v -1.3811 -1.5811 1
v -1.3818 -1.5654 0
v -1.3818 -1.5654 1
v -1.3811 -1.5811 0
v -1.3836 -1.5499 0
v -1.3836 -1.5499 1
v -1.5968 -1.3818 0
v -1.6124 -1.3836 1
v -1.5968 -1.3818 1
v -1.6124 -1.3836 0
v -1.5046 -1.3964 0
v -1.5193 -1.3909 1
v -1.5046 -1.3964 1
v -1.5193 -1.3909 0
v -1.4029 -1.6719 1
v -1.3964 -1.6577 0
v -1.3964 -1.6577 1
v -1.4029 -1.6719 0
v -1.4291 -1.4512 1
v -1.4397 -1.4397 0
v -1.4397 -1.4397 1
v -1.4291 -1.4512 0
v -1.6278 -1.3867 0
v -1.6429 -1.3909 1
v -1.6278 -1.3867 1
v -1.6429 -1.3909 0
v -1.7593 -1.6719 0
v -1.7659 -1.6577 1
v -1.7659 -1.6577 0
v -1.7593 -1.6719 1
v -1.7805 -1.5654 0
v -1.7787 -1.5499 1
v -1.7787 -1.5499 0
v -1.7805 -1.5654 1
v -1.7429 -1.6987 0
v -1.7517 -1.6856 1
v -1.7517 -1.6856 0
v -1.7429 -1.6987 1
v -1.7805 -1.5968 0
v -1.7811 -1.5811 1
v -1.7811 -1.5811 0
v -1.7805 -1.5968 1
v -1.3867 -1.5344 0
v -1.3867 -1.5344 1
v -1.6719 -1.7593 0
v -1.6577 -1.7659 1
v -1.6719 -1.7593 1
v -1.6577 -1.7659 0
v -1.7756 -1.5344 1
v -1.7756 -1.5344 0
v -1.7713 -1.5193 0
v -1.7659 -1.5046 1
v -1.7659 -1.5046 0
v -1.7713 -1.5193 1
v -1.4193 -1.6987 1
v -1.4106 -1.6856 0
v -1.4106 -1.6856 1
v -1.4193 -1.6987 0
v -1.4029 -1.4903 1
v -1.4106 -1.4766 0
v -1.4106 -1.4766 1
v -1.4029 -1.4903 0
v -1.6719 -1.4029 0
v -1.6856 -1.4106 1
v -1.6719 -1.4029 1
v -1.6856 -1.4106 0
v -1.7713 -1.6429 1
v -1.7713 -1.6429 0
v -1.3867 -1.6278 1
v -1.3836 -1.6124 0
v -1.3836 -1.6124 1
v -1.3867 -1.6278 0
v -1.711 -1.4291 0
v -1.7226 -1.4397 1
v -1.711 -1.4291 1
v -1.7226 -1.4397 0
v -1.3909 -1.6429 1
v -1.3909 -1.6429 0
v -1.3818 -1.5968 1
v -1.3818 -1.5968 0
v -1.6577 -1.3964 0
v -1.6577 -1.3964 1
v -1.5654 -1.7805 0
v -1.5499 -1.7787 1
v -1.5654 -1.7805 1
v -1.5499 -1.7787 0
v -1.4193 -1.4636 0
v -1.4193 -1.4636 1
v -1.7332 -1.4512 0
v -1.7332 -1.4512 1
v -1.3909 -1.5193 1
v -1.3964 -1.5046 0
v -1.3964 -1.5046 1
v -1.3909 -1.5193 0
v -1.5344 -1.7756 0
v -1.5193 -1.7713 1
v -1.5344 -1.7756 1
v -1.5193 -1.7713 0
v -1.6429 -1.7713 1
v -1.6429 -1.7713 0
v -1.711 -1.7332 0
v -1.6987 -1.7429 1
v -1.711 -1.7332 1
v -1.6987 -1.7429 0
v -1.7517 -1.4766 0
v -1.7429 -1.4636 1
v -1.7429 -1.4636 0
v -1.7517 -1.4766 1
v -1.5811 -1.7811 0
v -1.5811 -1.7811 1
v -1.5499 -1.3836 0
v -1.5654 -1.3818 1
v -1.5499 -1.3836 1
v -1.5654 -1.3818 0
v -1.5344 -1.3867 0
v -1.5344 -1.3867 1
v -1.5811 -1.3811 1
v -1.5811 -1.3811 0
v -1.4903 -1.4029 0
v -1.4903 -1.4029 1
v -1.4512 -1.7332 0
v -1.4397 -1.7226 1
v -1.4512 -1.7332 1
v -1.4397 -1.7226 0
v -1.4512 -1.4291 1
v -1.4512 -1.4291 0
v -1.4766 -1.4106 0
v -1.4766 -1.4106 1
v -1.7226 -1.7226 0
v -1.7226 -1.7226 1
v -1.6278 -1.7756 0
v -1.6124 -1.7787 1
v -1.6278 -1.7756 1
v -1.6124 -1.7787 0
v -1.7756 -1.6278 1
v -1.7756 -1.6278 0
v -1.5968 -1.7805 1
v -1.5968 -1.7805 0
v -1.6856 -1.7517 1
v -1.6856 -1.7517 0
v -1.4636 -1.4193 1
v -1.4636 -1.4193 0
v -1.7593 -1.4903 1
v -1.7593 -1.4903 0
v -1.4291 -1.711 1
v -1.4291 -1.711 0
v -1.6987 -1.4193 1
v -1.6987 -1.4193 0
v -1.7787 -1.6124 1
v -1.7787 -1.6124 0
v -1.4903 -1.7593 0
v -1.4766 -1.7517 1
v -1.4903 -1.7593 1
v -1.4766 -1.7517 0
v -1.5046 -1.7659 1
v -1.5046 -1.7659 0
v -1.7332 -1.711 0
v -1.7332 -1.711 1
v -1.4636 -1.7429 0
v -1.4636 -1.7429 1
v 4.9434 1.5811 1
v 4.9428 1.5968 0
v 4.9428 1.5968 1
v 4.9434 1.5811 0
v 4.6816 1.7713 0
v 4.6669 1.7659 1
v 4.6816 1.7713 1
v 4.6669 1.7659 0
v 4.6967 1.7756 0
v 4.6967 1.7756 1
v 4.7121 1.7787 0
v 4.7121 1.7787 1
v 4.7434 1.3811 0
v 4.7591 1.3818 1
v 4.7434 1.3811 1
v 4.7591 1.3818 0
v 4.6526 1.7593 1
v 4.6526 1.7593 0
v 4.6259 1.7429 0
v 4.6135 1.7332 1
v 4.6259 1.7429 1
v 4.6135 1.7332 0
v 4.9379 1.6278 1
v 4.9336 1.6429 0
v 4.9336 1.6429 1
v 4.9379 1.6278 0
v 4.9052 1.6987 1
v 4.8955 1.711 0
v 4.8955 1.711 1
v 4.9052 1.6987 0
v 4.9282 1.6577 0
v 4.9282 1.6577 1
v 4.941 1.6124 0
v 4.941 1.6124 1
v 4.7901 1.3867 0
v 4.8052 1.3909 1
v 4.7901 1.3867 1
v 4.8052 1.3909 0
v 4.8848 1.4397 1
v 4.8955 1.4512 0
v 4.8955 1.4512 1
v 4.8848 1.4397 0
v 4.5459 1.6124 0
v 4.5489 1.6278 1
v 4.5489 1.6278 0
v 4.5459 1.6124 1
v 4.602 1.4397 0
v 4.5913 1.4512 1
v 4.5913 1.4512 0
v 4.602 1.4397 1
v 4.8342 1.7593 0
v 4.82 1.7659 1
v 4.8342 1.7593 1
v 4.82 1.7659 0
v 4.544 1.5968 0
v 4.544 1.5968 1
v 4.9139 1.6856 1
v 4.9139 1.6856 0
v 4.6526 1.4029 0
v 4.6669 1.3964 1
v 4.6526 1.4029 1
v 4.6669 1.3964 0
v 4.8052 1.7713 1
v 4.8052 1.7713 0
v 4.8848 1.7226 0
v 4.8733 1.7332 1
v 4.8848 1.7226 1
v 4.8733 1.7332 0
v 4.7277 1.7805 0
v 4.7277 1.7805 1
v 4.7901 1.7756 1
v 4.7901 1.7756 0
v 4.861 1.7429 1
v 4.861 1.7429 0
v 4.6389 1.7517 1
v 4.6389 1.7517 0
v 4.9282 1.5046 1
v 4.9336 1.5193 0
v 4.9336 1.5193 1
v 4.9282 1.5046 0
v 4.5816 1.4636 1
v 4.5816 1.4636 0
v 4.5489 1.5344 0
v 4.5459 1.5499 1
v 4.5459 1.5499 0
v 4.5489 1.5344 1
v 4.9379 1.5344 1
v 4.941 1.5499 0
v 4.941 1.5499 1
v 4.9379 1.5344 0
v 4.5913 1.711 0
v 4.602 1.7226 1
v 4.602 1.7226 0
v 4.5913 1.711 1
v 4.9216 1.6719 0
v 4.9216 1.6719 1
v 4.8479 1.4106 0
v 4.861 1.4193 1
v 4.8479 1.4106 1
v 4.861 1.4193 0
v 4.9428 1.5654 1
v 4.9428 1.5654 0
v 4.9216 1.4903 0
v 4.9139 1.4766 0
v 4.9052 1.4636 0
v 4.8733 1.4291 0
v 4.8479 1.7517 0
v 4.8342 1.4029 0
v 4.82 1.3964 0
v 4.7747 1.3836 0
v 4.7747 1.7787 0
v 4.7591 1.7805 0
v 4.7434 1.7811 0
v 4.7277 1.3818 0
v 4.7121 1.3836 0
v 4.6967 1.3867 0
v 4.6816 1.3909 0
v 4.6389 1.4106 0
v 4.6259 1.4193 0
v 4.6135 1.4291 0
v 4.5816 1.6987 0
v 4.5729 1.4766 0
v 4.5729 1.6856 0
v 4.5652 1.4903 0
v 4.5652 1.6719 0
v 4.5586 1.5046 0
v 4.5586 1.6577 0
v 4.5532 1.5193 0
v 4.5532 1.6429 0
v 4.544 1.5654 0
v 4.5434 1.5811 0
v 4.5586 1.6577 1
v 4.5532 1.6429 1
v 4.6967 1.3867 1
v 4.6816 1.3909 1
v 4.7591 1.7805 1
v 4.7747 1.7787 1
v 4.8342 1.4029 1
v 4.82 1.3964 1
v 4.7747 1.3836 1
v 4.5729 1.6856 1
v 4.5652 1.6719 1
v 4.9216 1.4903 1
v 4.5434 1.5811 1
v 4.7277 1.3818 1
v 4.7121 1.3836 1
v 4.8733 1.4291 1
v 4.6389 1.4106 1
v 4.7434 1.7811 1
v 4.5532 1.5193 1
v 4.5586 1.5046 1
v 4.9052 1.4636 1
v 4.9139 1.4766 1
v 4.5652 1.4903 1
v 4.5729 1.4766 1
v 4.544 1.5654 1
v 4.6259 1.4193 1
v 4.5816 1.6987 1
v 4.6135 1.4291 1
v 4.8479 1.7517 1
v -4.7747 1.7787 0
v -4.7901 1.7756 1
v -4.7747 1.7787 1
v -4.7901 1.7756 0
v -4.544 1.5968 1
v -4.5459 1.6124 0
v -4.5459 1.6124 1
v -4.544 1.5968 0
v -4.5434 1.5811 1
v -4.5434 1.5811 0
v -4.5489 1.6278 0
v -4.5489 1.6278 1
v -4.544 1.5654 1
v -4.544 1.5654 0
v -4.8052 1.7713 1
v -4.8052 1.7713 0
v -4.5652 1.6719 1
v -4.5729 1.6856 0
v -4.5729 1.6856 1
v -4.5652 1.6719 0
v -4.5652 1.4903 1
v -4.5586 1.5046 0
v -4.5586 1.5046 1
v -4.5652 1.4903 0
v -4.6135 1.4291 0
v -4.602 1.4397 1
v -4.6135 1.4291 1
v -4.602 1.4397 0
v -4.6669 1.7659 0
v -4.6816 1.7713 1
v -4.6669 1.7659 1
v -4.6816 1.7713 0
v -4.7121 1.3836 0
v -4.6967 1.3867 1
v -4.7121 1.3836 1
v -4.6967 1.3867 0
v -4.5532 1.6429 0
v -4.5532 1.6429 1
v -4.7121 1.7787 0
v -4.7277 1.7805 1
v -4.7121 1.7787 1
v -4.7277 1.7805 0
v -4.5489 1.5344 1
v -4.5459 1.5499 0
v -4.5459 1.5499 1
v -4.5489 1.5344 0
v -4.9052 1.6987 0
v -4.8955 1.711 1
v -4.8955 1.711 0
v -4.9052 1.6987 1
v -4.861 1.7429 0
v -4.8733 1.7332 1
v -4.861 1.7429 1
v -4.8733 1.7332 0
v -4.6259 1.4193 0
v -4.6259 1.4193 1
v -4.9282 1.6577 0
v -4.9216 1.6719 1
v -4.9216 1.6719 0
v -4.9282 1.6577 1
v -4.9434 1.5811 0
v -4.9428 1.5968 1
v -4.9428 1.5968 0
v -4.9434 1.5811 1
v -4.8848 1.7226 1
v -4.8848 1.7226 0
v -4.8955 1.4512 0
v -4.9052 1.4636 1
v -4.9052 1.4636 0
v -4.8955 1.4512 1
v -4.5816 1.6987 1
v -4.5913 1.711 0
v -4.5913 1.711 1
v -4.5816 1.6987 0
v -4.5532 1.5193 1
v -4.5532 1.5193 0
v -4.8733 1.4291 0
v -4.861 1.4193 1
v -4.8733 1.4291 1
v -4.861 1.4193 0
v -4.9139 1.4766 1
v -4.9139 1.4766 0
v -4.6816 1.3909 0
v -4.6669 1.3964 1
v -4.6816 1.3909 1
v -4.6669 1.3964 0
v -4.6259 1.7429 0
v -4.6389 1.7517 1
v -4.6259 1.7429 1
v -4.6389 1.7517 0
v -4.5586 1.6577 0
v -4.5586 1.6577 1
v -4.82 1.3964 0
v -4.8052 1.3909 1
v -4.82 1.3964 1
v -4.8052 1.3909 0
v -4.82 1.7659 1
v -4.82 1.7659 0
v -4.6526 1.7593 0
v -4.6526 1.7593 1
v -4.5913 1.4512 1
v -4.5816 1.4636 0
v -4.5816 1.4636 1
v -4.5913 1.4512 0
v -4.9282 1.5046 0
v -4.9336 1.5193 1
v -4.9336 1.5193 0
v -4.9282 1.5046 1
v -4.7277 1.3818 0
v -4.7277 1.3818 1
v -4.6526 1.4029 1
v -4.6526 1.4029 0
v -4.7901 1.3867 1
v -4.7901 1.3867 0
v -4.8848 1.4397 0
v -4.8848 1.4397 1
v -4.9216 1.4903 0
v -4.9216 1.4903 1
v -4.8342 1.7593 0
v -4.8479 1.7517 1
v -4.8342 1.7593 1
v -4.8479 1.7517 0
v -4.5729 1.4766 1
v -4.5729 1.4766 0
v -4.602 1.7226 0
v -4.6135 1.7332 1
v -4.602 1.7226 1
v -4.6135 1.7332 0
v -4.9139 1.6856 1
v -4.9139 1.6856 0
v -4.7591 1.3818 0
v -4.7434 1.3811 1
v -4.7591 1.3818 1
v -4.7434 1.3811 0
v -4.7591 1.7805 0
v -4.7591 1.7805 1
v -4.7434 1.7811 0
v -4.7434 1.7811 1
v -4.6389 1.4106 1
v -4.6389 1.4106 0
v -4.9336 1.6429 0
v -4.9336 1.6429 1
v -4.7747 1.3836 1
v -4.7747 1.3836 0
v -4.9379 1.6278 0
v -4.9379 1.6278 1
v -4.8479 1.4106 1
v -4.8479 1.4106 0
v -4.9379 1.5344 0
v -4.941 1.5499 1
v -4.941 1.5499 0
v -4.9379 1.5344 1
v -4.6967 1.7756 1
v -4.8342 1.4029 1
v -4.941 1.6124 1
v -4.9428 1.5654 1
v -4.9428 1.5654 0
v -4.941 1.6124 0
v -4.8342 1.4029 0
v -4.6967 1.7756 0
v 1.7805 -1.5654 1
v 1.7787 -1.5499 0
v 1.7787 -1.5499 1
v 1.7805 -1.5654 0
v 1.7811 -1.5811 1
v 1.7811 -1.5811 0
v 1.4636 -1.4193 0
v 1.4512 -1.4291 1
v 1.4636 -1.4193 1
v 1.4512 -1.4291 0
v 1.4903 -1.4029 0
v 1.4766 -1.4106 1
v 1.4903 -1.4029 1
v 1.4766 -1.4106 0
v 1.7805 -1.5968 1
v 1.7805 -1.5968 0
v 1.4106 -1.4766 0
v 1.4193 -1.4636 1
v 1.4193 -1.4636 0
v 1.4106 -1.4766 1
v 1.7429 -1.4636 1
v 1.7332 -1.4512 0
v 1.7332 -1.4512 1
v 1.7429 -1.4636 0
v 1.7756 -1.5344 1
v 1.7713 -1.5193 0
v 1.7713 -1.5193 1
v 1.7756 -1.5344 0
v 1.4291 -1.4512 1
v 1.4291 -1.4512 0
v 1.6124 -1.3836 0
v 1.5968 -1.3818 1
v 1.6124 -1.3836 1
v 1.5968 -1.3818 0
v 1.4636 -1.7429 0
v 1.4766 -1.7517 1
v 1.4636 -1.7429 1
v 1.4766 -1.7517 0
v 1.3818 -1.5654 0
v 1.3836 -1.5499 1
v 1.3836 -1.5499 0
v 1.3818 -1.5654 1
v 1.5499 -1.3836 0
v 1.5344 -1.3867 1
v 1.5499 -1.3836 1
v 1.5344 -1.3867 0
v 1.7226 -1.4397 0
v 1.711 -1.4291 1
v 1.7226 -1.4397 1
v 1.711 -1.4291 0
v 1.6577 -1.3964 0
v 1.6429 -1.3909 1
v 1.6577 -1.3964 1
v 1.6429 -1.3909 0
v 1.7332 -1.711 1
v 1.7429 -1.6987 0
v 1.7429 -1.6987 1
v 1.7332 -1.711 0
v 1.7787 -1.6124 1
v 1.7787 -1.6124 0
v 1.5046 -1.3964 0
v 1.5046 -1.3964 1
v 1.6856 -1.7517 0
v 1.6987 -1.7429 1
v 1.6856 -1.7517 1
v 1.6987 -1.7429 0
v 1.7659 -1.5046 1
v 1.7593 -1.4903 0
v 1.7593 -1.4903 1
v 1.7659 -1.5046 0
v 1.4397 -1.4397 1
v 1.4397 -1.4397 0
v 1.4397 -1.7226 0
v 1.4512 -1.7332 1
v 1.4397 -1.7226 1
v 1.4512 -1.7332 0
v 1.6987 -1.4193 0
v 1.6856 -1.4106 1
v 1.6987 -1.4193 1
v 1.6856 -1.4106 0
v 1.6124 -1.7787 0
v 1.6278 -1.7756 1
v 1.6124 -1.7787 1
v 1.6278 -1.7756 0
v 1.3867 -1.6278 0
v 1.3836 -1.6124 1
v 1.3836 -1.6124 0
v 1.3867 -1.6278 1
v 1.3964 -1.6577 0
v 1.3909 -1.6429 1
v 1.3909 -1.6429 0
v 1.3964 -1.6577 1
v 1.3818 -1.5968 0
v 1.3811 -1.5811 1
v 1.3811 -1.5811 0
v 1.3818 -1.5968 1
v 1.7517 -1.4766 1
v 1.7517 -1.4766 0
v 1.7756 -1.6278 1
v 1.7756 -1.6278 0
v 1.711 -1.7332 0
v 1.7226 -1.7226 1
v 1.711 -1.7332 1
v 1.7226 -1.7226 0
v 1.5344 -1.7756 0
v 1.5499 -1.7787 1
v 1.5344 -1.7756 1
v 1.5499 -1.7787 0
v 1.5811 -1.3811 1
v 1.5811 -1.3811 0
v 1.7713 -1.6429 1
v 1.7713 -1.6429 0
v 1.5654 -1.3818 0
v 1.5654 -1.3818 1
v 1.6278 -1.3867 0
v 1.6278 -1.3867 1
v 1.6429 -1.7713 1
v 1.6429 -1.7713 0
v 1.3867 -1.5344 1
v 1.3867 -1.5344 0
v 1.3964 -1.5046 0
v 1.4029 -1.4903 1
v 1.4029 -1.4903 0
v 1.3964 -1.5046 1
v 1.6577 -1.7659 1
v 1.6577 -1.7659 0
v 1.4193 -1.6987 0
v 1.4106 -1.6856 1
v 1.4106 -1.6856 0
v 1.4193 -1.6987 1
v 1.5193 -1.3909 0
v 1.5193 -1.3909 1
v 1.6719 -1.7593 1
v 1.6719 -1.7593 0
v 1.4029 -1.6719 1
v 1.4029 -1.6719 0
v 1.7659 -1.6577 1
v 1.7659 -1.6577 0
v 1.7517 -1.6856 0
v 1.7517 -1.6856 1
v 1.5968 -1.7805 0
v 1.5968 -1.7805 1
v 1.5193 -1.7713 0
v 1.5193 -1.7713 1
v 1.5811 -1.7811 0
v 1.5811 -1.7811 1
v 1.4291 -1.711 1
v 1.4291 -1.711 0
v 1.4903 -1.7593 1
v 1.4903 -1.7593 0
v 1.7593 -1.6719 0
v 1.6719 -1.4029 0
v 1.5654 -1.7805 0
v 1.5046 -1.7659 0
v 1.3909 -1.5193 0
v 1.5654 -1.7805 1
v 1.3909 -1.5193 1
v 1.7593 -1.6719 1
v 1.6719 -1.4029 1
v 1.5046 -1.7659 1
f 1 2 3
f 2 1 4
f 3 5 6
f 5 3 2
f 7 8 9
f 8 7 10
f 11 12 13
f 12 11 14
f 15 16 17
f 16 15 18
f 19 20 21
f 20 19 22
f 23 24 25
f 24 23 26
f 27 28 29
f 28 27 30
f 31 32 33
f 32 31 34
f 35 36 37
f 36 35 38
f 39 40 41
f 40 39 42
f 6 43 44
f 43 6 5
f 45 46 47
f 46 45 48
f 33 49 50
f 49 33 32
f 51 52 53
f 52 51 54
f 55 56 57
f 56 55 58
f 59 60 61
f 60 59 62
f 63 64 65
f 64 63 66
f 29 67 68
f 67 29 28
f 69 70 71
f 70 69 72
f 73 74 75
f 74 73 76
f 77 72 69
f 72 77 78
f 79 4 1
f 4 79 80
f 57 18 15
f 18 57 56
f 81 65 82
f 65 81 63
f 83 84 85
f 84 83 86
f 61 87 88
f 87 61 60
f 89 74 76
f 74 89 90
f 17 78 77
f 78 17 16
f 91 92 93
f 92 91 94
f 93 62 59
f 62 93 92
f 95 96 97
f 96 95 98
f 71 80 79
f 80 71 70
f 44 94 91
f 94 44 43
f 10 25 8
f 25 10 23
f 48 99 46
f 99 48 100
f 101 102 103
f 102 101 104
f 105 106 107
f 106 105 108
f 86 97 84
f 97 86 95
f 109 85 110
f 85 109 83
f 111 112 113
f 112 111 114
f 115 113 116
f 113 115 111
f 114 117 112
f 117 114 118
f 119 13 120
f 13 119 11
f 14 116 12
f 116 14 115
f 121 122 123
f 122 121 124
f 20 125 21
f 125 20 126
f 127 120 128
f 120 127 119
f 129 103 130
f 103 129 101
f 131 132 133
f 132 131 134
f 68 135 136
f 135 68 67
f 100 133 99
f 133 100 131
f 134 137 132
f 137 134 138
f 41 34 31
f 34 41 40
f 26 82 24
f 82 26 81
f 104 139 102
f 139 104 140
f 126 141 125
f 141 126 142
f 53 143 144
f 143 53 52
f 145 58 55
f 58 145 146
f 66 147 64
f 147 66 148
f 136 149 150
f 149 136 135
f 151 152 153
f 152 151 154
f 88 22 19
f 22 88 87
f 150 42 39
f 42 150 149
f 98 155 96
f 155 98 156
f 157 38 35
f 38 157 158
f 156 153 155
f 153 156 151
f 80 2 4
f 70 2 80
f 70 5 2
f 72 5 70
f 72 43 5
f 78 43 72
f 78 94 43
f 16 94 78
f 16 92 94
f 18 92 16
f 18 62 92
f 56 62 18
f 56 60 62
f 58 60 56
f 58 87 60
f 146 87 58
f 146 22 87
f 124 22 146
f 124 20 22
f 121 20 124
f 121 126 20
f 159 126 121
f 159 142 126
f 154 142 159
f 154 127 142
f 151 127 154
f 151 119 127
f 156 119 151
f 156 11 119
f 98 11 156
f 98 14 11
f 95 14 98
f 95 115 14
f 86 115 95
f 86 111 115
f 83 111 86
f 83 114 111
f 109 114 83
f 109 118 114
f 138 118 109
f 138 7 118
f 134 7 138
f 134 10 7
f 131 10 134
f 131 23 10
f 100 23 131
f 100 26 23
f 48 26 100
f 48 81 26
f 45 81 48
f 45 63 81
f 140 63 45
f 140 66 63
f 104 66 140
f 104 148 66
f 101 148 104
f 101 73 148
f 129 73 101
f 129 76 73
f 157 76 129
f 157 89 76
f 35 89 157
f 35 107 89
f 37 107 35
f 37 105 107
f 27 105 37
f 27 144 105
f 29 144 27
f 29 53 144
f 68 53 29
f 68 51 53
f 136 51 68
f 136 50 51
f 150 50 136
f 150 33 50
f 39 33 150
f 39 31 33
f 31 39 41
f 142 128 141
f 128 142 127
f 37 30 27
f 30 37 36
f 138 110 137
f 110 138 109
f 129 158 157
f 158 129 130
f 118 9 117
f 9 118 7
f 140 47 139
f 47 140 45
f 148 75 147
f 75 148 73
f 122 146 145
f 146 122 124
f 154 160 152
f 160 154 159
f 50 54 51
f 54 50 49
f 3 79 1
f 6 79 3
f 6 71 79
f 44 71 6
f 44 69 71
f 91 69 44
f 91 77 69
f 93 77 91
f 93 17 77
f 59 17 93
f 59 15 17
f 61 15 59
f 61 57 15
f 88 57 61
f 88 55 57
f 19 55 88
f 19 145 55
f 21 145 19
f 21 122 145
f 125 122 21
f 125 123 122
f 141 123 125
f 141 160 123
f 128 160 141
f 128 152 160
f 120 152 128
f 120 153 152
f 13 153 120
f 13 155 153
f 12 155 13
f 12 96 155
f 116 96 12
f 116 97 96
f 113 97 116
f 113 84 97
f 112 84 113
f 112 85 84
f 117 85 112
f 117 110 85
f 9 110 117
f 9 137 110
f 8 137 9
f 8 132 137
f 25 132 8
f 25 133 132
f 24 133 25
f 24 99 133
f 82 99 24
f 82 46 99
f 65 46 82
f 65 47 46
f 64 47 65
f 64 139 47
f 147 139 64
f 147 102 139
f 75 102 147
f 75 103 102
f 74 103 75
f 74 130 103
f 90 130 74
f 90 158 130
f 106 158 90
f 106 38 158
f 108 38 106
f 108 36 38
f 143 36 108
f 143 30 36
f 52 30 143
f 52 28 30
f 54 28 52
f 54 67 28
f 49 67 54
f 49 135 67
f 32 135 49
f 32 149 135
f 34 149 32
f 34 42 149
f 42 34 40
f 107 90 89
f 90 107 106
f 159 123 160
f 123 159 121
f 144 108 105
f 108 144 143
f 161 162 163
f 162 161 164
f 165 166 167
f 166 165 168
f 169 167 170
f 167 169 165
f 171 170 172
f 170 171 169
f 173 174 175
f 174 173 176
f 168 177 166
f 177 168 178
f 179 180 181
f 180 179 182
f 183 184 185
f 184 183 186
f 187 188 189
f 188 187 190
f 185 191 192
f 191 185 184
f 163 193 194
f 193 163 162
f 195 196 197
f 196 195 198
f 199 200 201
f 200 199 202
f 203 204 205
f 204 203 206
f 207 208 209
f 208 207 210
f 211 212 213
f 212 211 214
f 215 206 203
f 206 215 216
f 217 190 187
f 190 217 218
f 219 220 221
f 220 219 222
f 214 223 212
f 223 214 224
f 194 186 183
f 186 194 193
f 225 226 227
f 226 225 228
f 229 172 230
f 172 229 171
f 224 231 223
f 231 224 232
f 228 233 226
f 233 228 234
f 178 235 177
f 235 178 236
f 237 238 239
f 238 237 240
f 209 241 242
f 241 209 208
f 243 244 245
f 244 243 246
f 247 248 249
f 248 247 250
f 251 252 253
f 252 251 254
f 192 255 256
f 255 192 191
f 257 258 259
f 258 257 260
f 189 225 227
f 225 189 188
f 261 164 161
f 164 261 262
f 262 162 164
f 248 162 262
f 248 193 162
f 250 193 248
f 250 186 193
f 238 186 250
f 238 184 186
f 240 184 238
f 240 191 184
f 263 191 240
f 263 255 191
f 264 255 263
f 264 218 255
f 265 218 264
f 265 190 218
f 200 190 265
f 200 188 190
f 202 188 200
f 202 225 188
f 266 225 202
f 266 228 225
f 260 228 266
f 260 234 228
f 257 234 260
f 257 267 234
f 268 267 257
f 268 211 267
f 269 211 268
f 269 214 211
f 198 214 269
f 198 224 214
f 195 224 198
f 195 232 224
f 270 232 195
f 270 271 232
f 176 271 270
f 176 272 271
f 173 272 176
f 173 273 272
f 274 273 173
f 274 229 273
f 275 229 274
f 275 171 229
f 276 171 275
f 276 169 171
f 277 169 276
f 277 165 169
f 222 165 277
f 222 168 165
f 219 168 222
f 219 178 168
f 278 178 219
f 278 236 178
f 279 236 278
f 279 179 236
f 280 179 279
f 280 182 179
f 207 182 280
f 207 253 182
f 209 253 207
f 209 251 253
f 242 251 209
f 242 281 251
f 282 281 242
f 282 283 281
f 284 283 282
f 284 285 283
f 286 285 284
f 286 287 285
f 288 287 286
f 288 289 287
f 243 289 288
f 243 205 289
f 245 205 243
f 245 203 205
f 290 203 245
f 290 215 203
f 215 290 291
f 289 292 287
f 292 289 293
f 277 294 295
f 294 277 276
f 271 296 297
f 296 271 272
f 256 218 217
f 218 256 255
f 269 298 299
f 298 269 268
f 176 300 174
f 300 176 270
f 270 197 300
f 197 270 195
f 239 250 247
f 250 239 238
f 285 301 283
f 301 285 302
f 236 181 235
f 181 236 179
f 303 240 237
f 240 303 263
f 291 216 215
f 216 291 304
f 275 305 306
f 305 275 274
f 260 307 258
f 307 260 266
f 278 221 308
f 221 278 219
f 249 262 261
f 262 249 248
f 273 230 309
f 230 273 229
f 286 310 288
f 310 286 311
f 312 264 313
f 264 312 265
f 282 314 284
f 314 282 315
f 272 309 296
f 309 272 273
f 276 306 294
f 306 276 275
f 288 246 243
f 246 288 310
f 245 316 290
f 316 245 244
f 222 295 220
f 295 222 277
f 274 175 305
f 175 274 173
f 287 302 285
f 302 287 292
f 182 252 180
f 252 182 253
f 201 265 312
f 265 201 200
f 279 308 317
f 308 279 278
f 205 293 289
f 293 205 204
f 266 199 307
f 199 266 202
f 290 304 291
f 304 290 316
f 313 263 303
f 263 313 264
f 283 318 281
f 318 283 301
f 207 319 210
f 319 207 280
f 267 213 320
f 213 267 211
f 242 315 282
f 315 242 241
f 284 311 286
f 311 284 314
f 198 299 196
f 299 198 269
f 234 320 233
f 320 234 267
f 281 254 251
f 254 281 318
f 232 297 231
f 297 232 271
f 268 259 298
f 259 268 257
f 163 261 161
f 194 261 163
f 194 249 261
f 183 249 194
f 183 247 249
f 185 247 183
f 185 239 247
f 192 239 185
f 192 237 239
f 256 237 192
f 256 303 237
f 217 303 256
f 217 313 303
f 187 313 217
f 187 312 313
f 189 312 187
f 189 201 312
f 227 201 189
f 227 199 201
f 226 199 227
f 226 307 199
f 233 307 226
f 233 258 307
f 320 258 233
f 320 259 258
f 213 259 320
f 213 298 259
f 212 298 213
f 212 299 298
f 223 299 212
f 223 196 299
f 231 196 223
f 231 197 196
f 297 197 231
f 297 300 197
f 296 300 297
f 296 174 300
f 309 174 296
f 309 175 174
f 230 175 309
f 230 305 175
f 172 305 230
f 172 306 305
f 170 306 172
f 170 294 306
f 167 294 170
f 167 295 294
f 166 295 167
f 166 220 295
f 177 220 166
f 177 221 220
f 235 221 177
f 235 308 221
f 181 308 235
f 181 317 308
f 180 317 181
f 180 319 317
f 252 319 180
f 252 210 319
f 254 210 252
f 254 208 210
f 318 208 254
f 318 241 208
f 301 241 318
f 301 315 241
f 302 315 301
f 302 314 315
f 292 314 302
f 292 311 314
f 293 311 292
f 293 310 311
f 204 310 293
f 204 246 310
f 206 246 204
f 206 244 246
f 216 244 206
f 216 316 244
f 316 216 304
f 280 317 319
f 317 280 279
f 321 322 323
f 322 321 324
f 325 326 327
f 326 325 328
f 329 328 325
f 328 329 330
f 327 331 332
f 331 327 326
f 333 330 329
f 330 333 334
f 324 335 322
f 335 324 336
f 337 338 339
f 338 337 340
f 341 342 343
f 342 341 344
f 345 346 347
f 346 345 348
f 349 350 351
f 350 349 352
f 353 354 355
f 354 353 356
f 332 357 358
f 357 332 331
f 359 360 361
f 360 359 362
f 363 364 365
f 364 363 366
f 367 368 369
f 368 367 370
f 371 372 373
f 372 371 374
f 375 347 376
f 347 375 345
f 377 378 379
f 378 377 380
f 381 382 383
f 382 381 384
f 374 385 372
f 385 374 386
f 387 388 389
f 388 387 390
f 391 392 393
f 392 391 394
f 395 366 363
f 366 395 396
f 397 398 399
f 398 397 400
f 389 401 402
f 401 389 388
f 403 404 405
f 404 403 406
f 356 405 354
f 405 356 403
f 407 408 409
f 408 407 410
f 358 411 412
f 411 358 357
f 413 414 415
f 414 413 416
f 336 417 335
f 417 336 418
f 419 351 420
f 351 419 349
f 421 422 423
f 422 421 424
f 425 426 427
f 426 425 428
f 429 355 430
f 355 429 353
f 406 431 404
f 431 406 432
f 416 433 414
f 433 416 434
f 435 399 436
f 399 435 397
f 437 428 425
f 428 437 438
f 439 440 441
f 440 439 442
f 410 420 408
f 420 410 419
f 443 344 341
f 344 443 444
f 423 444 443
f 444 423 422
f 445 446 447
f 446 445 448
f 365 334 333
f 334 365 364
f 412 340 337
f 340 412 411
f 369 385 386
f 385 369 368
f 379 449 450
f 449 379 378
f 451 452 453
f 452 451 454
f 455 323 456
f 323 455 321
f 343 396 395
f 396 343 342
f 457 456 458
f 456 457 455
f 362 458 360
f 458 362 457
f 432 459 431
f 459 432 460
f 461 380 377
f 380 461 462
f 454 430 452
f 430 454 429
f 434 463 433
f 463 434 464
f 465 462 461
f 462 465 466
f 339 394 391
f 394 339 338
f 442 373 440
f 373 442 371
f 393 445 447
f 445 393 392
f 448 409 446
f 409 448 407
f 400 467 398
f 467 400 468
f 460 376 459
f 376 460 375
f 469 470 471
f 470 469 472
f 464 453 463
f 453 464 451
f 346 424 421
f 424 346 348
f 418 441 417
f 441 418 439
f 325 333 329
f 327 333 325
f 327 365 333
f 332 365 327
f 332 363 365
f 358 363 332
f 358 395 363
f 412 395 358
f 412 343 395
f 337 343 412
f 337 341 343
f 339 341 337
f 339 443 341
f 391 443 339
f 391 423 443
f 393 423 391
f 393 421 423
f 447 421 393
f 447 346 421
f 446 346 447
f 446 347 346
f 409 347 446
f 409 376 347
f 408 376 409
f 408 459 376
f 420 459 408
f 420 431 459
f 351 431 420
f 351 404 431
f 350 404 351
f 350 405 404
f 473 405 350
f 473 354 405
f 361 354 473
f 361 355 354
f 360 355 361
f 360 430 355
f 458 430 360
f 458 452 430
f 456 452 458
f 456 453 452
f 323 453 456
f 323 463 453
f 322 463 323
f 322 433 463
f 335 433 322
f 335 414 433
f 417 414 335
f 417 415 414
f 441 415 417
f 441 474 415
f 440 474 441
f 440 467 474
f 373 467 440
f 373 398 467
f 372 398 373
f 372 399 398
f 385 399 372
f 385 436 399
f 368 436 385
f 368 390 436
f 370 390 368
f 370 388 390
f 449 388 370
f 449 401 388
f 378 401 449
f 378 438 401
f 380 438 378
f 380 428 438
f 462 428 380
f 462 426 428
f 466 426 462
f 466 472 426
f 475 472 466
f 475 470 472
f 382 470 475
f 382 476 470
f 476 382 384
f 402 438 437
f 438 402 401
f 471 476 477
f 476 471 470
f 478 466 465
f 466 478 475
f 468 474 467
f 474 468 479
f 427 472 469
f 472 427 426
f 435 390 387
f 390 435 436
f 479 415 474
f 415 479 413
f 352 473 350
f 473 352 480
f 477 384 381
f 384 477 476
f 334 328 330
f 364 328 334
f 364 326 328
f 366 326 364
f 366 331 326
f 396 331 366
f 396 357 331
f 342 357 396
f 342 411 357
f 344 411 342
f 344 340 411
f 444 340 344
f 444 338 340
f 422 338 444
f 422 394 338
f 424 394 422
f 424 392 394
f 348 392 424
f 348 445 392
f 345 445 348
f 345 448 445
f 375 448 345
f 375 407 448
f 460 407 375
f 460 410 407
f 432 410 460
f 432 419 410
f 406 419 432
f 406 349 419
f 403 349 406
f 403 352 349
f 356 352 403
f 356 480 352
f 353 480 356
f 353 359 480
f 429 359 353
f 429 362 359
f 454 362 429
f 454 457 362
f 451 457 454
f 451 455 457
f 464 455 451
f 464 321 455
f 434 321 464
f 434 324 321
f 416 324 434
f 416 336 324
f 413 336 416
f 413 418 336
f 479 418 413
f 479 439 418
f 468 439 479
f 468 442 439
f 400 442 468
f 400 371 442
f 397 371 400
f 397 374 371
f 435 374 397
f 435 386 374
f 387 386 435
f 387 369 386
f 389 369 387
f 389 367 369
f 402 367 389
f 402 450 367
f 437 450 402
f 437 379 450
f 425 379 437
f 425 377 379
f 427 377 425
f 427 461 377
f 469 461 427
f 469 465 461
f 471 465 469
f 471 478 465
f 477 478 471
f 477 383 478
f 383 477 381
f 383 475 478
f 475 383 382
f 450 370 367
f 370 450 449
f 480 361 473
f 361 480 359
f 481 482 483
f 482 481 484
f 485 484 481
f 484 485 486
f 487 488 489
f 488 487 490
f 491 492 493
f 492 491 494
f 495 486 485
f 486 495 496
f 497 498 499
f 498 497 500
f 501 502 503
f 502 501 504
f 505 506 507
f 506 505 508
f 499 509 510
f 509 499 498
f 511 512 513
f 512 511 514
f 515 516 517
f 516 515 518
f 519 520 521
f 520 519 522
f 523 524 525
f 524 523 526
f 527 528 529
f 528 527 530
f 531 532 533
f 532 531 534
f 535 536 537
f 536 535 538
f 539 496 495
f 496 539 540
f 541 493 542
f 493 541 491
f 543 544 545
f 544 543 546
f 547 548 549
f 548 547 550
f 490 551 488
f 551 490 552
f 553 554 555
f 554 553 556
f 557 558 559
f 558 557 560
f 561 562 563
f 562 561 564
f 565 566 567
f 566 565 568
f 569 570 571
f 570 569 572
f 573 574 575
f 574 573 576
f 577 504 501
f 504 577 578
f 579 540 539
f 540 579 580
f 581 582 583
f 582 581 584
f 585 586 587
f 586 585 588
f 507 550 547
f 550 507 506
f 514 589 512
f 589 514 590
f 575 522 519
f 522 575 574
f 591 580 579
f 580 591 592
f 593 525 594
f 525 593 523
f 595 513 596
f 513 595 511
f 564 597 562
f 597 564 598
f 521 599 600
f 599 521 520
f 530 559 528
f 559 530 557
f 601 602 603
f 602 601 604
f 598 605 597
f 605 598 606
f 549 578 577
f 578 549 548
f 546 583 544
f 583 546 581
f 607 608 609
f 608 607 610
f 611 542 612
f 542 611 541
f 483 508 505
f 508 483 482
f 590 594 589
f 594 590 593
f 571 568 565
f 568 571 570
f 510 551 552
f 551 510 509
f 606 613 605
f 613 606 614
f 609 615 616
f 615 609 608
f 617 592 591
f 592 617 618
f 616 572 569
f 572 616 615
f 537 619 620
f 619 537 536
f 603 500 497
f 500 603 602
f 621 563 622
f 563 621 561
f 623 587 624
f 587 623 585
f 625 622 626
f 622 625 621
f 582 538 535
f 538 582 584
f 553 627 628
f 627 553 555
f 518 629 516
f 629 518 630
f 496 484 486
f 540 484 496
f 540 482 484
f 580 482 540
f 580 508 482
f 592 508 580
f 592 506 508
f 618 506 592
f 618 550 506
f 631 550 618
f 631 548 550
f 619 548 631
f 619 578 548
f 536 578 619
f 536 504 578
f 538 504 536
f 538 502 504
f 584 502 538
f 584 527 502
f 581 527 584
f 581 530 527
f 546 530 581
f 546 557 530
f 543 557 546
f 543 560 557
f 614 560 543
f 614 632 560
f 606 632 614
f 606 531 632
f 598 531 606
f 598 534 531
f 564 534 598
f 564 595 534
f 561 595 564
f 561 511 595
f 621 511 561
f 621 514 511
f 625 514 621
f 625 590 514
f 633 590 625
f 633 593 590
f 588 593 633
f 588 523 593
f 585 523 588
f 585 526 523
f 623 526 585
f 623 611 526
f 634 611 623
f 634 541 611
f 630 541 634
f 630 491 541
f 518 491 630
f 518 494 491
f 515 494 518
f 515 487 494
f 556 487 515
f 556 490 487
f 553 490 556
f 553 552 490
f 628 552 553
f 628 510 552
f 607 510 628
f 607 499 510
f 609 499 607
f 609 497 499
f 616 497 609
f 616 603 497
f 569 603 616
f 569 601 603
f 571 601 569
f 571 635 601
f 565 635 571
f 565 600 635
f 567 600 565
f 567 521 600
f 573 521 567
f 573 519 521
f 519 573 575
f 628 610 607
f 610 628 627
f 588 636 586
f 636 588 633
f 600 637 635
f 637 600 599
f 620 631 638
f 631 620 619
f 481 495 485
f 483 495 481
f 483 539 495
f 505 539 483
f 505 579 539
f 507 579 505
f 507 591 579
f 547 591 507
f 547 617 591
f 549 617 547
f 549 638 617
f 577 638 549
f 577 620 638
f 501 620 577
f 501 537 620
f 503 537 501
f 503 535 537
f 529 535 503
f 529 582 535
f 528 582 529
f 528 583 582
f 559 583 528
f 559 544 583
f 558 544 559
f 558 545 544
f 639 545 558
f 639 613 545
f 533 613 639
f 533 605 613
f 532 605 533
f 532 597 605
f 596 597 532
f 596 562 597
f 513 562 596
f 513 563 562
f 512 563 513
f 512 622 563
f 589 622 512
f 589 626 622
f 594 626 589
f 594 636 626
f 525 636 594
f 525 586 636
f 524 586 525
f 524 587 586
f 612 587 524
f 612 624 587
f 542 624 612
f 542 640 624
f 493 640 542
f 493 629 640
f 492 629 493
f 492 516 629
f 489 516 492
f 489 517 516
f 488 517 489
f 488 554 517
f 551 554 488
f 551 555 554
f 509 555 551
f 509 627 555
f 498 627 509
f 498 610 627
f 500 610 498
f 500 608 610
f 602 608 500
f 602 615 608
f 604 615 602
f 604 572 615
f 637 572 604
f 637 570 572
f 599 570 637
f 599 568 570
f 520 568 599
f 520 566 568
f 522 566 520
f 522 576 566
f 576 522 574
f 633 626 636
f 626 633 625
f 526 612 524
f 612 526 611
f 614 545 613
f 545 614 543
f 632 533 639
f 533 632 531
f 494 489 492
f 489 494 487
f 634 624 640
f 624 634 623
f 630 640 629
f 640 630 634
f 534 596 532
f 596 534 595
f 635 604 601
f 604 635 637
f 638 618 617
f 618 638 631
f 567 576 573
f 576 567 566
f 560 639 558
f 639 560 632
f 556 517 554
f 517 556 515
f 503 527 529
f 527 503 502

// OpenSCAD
// Generated by SolidPython 1.1.3 on 2026-03-31 17:10:39
$fn = 80;


union() {
	translate(v = [-1.5811388300841898, -1.5811388300841898, 0]) {
		cylinder(h = 1.0000000000, r = 0.2000000000);
	}
	translate(v = [4.743416490252569, 1.58113883008419, 0]) {
		cylinder(h = 1.0000000000, r = 0.2000000000);
	}
	translate(v = [-4.743416490252569, 1.581138830084189, 0]) {
		cylinder(h = 1.0000000000, r = 0.2000000000);
	}
	translate(v = [1.58113883008419, -1.5811388300841895, 0]) {
		cylinder(h = 1.0000000000, r = 0.2000000000);
	}
}
/***********************************************
*********      SolidPython code:      **********
************************************************
 
import numpy as np
import math
import subprocess
from solid import *
from solid.utils import *

# --------------------------------------------------
# INPUT PATH
# --------------------------------------------------

POINTS = np.array([
    [0.0, 0.0],
    [0.0, 1.0],
    [1.0, 0.0],
    [0.0, 0.0],
], dtype=float)

FOLLOWER_RADIUS = 0.2
CYLINDER_HEIGHT = 1.0
TARGET_SCALE = 5.0
NUM_SAMPLED_POINTS = len(POINTS)

SCAD_FILENAME = "groove_debug.scad"
STL_FILENAME = "groove_debug.stl"

# --------------------------------------------------
# HELPERS
# --------------------------------------------------

def rotation_matrix(theta):
    c = math.cos(theta)
    s = math.sin(theta)
    return np.array([
        [c, -s],
        [s,  c]
    ], dtype=float)

def normalize_and_scale_points(points, target_scale=1.0):
    pts = np.array(points, dtype=float)

    # Center the points
    pts = pts - pts.mean(axis=0)

    # Find the largest radius from origin
    radii = np.linalg.norm(pts, axis=1)
    max_radius = np.max(radii)

    # Avoid division by zero
    if max_radius < 1e-12:
        return pts

    # Scale so the maximum radius becomes target_scale
    pts = pts / max_radius * target_scale
    return pts

# --------------------------------------------------
# PREPARE PATH
# --------------------------------------------------

pts = normalize_and_scale_points(POINTS, TARGET_SCALE)
d_theta = 2 * math.pi / NUM_SAMPLED_POINTS

# --------------------------------------------------
# BUILD DEBUG GROOVE AS CYLINDERS
# --------------------------------------------------

cylinders = []

for i in range(NUM_SAMPLED_POINTS):
    theta = i * d_theta

    # Desired follower location in world frame
    Q = pts[i]

    # Groove point in cam frame
    C = rotation_matrix(-theta) @ Q
    x, y = C

    cyl = translate([x, y, 0])(
        cylinder(r=FOLLOWER_RADIUS, h=CYLINDER_HEIGHT)
    )

    cylinders.append(cyl)

groove_debug = union()(*cylinders)

# --------------------------------------------------
# WRITE SCAD
# --------------------------------------------------

scad_render_to_file(
    groove_debug,
    SCAD_FILENAME,
    file_header='$fn = 80;'
)

print(f"Wrote {SCAD_FILENAME}")

# --------------------------------------------------
# CONVERT SCAD -> STL
# --------------------------------------------------

try:
    subprocess.run(
        ["openscad", "-o", STL_FILENAME, SCAD_FILENAME],
        check=True
    )
    print(f"Wrote {STL_FILENAME}")
except FileNotFoundError:
    print("Could not find the 'openscad' command.")
    print("Install OpenSCAD and make sure the 'openscad' CLI is available in your terminal PATH.")
except subprocess.CalledProcessError as e:
    print("OpenSCAD failed while converting SCAD to STL.")
    print(e) 
 
************************************************/
